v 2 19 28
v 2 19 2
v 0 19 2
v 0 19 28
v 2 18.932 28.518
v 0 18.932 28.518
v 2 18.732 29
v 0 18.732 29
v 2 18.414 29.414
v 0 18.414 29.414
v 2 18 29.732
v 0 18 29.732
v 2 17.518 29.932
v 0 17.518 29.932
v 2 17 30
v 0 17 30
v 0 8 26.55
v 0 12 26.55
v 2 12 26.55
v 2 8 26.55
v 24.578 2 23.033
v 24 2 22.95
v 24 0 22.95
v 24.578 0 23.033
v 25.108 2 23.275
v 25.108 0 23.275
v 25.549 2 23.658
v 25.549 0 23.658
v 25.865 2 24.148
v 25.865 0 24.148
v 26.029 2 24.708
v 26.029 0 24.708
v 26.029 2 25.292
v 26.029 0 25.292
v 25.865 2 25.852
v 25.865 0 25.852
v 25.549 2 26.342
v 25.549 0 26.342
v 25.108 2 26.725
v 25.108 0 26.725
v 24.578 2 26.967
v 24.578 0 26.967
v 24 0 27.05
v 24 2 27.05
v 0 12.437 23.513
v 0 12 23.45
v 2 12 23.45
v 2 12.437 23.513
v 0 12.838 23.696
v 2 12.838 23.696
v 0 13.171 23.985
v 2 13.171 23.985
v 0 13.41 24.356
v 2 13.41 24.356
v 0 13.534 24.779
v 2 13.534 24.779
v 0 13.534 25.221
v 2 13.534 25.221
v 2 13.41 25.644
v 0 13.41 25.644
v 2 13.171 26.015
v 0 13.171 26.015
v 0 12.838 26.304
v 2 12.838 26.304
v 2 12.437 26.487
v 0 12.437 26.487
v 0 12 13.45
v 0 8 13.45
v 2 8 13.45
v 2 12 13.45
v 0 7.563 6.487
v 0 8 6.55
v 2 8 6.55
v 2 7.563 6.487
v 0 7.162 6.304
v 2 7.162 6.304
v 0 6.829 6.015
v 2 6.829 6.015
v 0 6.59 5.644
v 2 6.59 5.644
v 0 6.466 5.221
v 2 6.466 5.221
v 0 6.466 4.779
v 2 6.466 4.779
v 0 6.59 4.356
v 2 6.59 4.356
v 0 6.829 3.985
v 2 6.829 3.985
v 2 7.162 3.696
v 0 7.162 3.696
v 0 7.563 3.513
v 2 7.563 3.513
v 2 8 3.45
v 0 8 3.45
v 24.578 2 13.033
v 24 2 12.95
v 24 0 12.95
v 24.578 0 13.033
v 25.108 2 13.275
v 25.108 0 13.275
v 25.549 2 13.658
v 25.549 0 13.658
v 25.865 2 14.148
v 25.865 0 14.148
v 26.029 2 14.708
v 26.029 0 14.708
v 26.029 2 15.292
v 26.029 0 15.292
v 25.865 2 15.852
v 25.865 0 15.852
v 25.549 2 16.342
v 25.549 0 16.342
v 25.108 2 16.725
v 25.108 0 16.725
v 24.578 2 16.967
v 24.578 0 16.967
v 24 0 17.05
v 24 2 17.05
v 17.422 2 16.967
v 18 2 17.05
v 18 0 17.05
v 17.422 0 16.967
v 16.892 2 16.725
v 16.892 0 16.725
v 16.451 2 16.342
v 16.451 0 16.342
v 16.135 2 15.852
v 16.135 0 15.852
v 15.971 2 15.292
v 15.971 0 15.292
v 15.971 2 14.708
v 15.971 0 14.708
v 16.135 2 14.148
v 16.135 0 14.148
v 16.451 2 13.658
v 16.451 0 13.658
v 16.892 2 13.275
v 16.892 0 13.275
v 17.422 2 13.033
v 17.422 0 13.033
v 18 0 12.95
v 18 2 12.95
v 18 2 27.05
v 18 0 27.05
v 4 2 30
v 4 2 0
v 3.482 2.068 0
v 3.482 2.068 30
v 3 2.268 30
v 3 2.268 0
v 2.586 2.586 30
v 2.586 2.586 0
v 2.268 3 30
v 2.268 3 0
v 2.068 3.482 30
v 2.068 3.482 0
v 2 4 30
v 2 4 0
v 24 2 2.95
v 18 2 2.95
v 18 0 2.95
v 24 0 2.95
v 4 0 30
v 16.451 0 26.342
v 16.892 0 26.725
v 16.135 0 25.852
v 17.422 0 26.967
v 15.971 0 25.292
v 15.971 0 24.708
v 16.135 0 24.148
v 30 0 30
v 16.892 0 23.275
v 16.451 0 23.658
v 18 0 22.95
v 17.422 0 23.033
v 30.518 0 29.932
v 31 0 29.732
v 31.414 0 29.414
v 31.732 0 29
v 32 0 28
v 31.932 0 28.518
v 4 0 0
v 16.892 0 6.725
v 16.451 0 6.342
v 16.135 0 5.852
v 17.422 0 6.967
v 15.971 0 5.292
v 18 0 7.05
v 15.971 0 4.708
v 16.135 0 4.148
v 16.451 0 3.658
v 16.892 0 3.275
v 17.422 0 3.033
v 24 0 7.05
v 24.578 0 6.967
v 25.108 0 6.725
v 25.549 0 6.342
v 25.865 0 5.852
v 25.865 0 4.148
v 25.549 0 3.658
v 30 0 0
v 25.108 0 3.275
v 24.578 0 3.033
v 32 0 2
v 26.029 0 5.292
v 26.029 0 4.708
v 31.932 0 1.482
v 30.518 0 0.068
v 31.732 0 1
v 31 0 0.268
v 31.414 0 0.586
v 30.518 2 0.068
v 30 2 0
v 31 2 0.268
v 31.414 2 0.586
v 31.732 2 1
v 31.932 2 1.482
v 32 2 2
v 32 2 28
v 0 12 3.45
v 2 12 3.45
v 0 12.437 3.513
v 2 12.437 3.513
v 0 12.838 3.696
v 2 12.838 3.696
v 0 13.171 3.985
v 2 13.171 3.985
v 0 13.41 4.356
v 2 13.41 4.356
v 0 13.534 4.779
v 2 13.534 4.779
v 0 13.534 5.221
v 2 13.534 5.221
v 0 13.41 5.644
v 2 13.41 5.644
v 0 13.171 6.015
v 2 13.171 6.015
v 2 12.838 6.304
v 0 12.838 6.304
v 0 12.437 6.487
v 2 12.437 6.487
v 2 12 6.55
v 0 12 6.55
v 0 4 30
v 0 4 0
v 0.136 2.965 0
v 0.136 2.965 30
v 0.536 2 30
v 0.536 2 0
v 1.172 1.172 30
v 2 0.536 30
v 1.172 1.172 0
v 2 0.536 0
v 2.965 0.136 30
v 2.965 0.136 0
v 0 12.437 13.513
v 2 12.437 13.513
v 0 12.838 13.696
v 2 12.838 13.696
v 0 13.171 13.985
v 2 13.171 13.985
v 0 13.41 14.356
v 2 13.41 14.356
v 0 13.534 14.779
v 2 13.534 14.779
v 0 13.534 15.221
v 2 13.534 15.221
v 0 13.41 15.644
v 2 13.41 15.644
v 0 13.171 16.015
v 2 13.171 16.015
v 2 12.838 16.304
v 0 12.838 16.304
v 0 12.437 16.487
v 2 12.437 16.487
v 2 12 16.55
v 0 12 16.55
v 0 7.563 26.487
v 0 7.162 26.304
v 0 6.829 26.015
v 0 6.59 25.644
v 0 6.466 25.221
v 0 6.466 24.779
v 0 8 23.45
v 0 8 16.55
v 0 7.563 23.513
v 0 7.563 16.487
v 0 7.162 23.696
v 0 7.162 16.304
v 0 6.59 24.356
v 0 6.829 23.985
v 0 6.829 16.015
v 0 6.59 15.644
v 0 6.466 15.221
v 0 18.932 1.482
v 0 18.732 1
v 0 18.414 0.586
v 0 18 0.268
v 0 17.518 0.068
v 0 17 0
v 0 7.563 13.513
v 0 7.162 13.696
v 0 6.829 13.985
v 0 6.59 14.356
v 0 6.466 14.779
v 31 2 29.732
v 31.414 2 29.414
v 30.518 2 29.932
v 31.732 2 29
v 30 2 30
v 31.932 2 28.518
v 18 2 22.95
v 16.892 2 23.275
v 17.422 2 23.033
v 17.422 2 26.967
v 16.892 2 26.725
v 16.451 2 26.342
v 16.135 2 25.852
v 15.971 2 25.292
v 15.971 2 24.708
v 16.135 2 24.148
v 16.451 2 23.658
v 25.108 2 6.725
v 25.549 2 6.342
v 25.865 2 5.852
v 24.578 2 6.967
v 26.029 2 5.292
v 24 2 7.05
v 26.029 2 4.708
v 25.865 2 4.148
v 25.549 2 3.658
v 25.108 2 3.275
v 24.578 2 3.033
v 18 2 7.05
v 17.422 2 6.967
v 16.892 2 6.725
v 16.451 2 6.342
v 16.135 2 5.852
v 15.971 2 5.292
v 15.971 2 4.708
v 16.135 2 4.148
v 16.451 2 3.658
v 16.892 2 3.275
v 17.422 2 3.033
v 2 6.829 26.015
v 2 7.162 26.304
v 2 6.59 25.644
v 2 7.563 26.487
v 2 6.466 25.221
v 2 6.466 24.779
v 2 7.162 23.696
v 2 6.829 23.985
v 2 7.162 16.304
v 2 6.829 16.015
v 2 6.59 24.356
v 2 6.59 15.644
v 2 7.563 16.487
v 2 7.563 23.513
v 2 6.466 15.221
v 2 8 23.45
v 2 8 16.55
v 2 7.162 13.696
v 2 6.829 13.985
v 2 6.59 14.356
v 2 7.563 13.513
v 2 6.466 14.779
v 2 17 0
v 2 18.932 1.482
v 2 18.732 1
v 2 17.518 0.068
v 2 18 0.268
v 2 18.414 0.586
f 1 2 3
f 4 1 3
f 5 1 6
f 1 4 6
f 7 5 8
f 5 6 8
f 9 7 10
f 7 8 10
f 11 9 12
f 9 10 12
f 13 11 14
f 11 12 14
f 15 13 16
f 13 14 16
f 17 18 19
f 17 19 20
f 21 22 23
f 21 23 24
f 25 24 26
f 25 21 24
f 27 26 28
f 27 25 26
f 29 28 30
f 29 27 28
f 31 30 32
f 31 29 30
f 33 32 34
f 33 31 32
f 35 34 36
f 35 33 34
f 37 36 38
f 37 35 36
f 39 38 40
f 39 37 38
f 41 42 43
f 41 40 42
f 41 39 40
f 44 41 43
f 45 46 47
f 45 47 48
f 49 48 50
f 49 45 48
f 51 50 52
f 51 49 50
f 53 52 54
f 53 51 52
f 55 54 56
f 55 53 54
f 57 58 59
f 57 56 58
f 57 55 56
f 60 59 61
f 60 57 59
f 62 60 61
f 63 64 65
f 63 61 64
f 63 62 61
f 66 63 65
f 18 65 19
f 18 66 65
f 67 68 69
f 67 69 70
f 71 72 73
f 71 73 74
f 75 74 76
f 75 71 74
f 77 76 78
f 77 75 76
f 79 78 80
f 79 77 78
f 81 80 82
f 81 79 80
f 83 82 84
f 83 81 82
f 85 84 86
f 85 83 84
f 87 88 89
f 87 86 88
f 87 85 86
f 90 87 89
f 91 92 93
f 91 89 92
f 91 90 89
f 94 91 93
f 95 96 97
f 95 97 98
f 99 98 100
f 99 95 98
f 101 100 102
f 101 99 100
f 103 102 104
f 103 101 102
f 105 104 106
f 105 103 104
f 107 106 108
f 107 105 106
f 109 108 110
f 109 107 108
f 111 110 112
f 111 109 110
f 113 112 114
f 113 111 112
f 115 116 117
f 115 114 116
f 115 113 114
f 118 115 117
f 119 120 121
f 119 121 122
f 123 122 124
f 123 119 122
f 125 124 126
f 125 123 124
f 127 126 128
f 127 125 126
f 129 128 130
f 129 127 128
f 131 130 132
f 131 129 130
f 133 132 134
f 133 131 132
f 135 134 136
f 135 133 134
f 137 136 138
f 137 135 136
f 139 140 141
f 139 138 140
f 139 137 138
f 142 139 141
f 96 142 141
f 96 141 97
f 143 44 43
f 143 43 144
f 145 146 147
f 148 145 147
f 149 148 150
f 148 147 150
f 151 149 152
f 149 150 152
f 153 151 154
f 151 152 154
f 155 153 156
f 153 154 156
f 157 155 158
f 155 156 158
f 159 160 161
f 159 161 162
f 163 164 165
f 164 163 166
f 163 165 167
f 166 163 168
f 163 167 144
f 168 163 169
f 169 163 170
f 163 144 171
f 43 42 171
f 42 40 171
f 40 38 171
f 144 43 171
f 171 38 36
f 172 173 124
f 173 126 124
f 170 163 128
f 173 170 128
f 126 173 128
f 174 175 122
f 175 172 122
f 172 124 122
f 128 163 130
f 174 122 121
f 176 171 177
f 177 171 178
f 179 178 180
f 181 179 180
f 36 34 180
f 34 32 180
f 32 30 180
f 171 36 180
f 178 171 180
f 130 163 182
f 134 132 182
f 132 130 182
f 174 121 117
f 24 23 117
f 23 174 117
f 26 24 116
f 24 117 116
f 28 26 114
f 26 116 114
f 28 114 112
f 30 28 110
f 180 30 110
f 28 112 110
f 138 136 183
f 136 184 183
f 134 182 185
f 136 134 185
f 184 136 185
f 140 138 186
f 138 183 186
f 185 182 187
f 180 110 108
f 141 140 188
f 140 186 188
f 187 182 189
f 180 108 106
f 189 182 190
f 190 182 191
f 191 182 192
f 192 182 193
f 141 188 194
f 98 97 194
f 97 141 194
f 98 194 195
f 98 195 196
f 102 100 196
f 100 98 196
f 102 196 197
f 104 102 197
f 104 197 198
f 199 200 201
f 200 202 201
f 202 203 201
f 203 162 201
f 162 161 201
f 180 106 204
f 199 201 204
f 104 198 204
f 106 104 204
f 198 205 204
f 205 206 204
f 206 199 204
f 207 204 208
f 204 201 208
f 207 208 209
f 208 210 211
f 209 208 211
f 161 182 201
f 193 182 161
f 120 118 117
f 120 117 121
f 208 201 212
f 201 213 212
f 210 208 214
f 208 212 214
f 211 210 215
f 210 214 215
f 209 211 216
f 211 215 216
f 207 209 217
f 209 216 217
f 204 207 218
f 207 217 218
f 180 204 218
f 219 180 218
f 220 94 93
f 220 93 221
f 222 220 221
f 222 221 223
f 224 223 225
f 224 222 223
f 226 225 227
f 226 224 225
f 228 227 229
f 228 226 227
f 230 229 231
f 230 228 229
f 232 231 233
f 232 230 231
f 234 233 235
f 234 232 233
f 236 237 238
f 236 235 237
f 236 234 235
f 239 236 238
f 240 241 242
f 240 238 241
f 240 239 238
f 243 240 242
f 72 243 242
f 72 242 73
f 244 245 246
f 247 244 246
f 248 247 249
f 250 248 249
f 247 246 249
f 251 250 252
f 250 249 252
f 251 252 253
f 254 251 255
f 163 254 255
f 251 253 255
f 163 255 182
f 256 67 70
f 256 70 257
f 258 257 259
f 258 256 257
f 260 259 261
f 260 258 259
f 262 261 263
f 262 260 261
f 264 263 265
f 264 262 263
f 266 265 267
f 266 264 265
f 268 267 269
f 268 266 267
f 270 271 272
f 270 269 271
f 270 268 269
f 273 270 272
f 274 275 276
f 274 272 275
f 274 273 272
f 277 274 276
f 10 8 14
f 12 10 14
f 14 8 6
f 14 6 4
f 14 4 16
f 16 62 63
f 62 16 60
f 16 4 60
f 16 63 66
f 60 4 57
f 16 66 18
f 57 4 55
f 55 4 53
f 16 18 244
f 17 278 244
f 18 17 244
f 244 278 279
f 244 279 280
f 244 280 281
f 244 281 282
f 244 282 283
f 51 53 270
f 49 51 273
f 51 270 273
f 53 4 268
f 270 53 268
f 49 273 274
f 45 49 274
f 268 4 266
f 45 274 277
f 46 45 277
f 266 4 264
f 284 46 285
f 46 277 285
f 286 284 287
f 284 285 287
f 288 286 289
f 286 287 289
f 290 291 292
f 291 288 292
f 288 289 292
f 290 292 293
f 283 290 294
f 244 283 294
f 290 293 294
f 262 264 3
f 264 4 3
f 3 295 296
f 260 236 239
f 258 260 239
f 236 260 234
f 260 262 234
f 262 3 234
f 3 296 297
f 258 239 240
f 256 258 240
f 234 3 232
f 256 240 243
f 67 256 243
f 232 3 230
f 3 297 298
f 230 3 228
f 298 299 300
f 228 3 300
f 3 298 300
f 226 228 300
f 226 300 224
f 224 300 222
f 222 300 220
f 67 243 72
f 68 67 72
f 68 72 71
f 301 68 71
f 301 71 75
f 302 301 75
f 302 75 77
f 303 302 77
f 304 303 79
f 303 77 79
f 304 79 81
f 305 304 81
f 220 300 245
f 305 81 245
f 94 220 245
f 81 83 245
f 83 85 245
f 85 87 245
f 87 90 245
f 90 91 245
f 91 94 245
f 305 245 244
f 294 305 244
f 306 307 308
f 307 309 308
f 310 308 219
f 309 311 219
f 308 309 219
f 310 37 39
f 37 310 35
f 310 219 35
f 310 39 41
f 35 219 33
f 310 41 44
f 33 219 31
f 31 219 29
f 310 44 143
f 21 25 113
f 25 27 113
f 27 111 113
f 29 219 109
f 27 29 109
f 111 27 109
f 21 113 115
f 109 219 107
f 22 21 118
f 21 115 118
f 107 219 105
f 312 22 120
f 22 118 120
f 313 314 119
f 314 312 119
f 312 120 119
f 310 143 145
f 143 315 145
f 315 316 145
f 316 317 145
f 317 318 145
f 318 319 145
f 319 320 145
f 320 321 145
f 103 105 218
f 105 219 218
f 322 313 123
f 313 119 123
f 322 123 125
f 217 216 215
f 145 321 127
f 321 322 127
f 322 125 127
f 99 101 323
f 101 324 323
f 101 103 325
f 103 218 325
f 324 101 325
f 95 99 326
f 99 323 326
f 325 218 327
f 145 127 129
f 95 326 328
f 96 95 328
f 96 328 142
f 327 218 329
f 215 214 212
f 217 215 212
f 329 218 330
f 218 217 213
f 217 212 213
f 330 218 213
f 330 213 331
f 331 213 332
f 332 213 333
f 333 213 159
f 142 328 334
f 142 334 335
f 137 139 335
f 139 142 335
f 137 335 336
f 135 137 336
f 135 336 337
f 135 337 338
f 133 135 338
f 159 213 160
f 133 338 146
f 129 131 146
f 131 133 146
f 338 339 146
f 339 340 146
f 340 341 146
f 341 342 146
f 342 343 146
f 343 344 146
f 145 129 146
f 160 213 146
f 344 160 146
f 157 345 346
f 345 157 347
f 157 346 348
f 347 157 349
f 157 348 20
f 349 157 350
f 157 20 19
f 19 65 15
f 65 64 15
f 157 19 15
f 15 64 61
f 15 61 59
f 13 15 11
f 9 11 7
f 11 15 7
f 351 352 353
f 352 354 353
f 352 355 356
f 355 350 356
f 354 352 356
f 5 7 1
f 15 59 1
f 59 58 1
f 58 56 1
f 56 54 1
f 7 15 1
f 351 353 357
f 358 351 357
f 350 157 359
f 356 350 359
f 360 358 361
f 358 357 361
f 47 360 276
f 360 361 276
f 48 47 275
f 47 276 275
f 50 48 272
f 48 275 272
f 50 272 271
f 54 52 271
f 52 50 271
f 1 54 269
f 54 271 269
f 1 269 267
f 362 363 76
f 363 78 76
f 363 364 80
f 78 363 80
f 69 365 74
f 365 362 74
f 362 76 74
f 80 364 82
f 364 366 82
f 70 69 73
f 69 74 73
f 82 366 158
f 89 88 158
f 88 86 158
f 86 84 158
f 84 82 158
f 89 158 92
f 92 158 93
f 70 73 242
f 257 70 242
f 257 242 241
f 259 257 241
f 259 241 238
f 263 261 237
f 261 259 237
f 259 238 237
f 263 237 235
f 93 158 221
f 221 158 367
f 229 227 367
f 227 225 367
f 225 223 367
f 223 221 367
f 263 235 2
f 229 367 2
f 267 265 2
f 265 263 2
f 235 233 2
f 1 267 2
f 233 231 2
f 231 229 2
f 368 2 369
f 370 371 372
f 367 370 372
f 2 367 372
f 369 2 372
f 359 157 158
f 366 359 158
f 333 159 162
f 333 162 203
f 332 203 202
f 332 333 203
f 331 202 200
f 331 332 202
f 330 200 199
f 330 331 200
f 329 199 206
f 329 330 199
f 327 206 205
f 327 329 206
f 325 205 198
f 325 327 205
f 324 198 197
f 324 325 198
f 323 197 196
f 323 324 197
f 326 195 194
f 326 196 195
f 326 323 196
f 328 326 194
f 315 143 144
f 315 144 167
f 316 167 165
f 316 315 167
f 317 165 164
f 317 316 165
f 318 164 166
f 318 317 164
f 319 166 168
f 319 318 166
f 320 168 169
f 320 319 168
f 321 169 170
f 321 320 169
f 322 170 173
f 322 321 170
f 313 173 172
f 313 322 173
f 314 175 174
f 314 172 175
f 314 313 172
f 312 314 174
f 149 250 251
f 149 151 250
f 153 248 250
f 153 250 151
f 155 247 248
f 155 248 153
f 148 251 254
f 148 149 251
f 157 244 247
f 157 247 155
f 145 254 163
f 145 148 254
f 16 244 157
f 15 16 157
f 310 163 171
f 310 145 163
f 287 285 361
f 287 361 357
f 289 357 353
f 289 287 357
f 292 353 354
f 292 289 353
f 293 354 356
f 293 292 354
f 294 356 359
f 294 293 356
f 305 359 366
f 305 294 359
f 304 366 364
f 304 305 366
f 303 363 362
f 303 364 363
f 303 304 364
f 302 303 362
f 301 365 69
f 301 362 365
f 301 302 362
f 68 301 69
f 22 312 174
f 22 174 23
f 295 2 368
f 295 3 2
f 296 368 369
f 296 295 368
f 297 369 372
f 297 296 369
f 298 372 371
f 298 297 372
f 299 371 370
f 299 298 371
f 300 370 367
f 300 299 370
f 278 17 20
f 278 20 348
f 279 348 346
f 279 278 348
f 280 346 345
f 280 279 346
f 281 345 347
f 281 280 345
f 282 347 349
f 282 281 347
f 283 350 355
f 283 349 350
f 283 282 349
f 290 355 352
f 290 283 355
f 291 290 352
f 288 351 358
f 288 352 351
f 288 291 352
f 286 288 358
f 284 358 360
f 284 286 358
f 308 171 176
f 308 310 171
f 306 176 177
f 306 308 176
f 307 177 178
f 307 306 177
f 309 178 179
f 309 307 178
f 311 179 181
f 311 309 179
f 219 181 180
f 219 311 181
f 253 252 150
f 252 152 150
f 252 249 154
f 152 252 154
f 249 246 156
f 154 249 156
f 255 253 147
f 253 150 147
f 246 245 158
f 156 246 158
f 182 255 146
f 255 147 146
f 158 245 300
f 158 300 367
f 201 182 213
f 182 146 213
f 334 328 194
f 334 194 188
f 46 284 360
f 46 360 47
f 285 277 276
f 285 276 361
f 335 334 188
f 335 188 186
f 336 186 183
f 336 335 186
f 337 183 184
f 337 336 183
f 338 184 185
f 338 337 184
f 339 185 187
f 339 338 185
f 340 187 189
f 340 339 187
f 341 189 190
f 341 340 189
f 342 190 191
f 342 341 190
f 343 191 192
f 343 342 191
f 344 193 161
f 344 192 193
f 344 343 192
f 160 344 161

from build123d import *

# Parameters (mm, degrees)
SM_BASE_FLANGE_1_DEPTH = 30
CUT_EXTRUDE_1_DEPTH    = 10
CUT_EXTRUDE_2_DEPTH    = 10
FILLET_1_R             = 2


# Sheet-metal steps are written as plain solids
with BuildPart() as part:
    # Sketch 1 → 基体-法兰1 (new body)
    with BuildSketch(Plane.XY):
        with BuildLine():
            Line((0, 19), (0, 4))
            ThreePointArc((0, 4), (1.171572875, 1.171572875), (4, 0))
            Line((4, 0), (32, 0))
            Line((32, 0), (32, 2))
            Line((32, 2), (4, 2))
            ThreePointArc((4, 2), (2.585786438, 2.585786438), (2, 4))
            Line((2, 4), (2, 19))
            Line((2, 19), (0, 19))
        make_face()
    extrude(amount=SM_BASE_FLANGE_1_DEPTH)

    # 草图6 → 切除-拉伸1 (cut)
    with BuildSketch(Plane.ZY):
        with BuildLine():
            Line((23.45, 8), (23.45, 12))
            ThreePointArc((23.45, 12), (25, 13.55), (26.55, 12))
            Line((26.55, 12), (26.55, 8))
            ThreePointArc((26.55, 8), (25, 6.45), (23.45, 8))
        make_face()
        with BuildLine():
            Line((13.45, 8), (13.45, 12))
            ThreePointArc((13.45, 12), (15, 13.55), (16.55, 12))
            Line((16.55, 12), (16.55, 8))
            ThreePointArc((16.55, 8), (15, 6.45), (13.45, 8))
        make_face()
        with BuildLine():
            Line((3.45, 8), (3.45, 12))
            ThreePointArc((3.45, 12), (5, 13.55), (6.55, 12))
            Line((6.55, 12), (6.55, 8))
            ThreePointArc((6.55, 8), (5, 6.45), (3.45, 8))
        make_face()
    extrude(amount=-CUT_EXTRUDE_1_DEPTH, mode=Mode.SUBTRACT)

    # 草图10 → 切除-拉伸2 (cut)
    with BuildSketch(Plane(origin=(0, 2, 0), x_dir=(1, 0, 0), z_dir=(0, 1, 0))):
        with BuildLine():
            Line((24, -27.05), (18, -27.05))
            ThreePointArc((18, -27.05), (15.95, -25), (18, -22.95))
            Line((18, -22.95), (24, -22.95))
            ThreePointArc((24, -22.95), (26.05, -25), (24, -27.05))
        make_face()
        with BuildLine():
            Line((24, -17.05), (18, -17.05))
            ThreePointArc((18, -17.05), (15.95, -15), (18, -12.95))
            Line((18, -12.95), (24, -12.95))
            ThreePointArc((24, -12.95), (26.05, -15), (24, -17.05))
        make_face()
        with BuildLine():
            Line((24, -7.05), (18, -7.05))
            ThreePointArc((18, -7.05), (15.95, -5), (18, -2.95))
            Line((18, -2.95), (24, -2.95))
            ThreePointArc((24, -2.95), (26.05, -5), (24, -7.05))
        make_face()
    extrude(amount=-CUT_EXTRUDE_2_DEPTH, mode=Mode.SUBTRACT)

    # 圆角1
    fillet_1_edges = [part.edges().sort_by_distance(p)[0] for p in [
        (1, 19, 30),
        (1, 19, 0),
        (32, 1, 30),
        (32, 1, 0),
    ]]
    fillet(fillet_1_edges, radius=FILLET_1_R)


solid = part.part
